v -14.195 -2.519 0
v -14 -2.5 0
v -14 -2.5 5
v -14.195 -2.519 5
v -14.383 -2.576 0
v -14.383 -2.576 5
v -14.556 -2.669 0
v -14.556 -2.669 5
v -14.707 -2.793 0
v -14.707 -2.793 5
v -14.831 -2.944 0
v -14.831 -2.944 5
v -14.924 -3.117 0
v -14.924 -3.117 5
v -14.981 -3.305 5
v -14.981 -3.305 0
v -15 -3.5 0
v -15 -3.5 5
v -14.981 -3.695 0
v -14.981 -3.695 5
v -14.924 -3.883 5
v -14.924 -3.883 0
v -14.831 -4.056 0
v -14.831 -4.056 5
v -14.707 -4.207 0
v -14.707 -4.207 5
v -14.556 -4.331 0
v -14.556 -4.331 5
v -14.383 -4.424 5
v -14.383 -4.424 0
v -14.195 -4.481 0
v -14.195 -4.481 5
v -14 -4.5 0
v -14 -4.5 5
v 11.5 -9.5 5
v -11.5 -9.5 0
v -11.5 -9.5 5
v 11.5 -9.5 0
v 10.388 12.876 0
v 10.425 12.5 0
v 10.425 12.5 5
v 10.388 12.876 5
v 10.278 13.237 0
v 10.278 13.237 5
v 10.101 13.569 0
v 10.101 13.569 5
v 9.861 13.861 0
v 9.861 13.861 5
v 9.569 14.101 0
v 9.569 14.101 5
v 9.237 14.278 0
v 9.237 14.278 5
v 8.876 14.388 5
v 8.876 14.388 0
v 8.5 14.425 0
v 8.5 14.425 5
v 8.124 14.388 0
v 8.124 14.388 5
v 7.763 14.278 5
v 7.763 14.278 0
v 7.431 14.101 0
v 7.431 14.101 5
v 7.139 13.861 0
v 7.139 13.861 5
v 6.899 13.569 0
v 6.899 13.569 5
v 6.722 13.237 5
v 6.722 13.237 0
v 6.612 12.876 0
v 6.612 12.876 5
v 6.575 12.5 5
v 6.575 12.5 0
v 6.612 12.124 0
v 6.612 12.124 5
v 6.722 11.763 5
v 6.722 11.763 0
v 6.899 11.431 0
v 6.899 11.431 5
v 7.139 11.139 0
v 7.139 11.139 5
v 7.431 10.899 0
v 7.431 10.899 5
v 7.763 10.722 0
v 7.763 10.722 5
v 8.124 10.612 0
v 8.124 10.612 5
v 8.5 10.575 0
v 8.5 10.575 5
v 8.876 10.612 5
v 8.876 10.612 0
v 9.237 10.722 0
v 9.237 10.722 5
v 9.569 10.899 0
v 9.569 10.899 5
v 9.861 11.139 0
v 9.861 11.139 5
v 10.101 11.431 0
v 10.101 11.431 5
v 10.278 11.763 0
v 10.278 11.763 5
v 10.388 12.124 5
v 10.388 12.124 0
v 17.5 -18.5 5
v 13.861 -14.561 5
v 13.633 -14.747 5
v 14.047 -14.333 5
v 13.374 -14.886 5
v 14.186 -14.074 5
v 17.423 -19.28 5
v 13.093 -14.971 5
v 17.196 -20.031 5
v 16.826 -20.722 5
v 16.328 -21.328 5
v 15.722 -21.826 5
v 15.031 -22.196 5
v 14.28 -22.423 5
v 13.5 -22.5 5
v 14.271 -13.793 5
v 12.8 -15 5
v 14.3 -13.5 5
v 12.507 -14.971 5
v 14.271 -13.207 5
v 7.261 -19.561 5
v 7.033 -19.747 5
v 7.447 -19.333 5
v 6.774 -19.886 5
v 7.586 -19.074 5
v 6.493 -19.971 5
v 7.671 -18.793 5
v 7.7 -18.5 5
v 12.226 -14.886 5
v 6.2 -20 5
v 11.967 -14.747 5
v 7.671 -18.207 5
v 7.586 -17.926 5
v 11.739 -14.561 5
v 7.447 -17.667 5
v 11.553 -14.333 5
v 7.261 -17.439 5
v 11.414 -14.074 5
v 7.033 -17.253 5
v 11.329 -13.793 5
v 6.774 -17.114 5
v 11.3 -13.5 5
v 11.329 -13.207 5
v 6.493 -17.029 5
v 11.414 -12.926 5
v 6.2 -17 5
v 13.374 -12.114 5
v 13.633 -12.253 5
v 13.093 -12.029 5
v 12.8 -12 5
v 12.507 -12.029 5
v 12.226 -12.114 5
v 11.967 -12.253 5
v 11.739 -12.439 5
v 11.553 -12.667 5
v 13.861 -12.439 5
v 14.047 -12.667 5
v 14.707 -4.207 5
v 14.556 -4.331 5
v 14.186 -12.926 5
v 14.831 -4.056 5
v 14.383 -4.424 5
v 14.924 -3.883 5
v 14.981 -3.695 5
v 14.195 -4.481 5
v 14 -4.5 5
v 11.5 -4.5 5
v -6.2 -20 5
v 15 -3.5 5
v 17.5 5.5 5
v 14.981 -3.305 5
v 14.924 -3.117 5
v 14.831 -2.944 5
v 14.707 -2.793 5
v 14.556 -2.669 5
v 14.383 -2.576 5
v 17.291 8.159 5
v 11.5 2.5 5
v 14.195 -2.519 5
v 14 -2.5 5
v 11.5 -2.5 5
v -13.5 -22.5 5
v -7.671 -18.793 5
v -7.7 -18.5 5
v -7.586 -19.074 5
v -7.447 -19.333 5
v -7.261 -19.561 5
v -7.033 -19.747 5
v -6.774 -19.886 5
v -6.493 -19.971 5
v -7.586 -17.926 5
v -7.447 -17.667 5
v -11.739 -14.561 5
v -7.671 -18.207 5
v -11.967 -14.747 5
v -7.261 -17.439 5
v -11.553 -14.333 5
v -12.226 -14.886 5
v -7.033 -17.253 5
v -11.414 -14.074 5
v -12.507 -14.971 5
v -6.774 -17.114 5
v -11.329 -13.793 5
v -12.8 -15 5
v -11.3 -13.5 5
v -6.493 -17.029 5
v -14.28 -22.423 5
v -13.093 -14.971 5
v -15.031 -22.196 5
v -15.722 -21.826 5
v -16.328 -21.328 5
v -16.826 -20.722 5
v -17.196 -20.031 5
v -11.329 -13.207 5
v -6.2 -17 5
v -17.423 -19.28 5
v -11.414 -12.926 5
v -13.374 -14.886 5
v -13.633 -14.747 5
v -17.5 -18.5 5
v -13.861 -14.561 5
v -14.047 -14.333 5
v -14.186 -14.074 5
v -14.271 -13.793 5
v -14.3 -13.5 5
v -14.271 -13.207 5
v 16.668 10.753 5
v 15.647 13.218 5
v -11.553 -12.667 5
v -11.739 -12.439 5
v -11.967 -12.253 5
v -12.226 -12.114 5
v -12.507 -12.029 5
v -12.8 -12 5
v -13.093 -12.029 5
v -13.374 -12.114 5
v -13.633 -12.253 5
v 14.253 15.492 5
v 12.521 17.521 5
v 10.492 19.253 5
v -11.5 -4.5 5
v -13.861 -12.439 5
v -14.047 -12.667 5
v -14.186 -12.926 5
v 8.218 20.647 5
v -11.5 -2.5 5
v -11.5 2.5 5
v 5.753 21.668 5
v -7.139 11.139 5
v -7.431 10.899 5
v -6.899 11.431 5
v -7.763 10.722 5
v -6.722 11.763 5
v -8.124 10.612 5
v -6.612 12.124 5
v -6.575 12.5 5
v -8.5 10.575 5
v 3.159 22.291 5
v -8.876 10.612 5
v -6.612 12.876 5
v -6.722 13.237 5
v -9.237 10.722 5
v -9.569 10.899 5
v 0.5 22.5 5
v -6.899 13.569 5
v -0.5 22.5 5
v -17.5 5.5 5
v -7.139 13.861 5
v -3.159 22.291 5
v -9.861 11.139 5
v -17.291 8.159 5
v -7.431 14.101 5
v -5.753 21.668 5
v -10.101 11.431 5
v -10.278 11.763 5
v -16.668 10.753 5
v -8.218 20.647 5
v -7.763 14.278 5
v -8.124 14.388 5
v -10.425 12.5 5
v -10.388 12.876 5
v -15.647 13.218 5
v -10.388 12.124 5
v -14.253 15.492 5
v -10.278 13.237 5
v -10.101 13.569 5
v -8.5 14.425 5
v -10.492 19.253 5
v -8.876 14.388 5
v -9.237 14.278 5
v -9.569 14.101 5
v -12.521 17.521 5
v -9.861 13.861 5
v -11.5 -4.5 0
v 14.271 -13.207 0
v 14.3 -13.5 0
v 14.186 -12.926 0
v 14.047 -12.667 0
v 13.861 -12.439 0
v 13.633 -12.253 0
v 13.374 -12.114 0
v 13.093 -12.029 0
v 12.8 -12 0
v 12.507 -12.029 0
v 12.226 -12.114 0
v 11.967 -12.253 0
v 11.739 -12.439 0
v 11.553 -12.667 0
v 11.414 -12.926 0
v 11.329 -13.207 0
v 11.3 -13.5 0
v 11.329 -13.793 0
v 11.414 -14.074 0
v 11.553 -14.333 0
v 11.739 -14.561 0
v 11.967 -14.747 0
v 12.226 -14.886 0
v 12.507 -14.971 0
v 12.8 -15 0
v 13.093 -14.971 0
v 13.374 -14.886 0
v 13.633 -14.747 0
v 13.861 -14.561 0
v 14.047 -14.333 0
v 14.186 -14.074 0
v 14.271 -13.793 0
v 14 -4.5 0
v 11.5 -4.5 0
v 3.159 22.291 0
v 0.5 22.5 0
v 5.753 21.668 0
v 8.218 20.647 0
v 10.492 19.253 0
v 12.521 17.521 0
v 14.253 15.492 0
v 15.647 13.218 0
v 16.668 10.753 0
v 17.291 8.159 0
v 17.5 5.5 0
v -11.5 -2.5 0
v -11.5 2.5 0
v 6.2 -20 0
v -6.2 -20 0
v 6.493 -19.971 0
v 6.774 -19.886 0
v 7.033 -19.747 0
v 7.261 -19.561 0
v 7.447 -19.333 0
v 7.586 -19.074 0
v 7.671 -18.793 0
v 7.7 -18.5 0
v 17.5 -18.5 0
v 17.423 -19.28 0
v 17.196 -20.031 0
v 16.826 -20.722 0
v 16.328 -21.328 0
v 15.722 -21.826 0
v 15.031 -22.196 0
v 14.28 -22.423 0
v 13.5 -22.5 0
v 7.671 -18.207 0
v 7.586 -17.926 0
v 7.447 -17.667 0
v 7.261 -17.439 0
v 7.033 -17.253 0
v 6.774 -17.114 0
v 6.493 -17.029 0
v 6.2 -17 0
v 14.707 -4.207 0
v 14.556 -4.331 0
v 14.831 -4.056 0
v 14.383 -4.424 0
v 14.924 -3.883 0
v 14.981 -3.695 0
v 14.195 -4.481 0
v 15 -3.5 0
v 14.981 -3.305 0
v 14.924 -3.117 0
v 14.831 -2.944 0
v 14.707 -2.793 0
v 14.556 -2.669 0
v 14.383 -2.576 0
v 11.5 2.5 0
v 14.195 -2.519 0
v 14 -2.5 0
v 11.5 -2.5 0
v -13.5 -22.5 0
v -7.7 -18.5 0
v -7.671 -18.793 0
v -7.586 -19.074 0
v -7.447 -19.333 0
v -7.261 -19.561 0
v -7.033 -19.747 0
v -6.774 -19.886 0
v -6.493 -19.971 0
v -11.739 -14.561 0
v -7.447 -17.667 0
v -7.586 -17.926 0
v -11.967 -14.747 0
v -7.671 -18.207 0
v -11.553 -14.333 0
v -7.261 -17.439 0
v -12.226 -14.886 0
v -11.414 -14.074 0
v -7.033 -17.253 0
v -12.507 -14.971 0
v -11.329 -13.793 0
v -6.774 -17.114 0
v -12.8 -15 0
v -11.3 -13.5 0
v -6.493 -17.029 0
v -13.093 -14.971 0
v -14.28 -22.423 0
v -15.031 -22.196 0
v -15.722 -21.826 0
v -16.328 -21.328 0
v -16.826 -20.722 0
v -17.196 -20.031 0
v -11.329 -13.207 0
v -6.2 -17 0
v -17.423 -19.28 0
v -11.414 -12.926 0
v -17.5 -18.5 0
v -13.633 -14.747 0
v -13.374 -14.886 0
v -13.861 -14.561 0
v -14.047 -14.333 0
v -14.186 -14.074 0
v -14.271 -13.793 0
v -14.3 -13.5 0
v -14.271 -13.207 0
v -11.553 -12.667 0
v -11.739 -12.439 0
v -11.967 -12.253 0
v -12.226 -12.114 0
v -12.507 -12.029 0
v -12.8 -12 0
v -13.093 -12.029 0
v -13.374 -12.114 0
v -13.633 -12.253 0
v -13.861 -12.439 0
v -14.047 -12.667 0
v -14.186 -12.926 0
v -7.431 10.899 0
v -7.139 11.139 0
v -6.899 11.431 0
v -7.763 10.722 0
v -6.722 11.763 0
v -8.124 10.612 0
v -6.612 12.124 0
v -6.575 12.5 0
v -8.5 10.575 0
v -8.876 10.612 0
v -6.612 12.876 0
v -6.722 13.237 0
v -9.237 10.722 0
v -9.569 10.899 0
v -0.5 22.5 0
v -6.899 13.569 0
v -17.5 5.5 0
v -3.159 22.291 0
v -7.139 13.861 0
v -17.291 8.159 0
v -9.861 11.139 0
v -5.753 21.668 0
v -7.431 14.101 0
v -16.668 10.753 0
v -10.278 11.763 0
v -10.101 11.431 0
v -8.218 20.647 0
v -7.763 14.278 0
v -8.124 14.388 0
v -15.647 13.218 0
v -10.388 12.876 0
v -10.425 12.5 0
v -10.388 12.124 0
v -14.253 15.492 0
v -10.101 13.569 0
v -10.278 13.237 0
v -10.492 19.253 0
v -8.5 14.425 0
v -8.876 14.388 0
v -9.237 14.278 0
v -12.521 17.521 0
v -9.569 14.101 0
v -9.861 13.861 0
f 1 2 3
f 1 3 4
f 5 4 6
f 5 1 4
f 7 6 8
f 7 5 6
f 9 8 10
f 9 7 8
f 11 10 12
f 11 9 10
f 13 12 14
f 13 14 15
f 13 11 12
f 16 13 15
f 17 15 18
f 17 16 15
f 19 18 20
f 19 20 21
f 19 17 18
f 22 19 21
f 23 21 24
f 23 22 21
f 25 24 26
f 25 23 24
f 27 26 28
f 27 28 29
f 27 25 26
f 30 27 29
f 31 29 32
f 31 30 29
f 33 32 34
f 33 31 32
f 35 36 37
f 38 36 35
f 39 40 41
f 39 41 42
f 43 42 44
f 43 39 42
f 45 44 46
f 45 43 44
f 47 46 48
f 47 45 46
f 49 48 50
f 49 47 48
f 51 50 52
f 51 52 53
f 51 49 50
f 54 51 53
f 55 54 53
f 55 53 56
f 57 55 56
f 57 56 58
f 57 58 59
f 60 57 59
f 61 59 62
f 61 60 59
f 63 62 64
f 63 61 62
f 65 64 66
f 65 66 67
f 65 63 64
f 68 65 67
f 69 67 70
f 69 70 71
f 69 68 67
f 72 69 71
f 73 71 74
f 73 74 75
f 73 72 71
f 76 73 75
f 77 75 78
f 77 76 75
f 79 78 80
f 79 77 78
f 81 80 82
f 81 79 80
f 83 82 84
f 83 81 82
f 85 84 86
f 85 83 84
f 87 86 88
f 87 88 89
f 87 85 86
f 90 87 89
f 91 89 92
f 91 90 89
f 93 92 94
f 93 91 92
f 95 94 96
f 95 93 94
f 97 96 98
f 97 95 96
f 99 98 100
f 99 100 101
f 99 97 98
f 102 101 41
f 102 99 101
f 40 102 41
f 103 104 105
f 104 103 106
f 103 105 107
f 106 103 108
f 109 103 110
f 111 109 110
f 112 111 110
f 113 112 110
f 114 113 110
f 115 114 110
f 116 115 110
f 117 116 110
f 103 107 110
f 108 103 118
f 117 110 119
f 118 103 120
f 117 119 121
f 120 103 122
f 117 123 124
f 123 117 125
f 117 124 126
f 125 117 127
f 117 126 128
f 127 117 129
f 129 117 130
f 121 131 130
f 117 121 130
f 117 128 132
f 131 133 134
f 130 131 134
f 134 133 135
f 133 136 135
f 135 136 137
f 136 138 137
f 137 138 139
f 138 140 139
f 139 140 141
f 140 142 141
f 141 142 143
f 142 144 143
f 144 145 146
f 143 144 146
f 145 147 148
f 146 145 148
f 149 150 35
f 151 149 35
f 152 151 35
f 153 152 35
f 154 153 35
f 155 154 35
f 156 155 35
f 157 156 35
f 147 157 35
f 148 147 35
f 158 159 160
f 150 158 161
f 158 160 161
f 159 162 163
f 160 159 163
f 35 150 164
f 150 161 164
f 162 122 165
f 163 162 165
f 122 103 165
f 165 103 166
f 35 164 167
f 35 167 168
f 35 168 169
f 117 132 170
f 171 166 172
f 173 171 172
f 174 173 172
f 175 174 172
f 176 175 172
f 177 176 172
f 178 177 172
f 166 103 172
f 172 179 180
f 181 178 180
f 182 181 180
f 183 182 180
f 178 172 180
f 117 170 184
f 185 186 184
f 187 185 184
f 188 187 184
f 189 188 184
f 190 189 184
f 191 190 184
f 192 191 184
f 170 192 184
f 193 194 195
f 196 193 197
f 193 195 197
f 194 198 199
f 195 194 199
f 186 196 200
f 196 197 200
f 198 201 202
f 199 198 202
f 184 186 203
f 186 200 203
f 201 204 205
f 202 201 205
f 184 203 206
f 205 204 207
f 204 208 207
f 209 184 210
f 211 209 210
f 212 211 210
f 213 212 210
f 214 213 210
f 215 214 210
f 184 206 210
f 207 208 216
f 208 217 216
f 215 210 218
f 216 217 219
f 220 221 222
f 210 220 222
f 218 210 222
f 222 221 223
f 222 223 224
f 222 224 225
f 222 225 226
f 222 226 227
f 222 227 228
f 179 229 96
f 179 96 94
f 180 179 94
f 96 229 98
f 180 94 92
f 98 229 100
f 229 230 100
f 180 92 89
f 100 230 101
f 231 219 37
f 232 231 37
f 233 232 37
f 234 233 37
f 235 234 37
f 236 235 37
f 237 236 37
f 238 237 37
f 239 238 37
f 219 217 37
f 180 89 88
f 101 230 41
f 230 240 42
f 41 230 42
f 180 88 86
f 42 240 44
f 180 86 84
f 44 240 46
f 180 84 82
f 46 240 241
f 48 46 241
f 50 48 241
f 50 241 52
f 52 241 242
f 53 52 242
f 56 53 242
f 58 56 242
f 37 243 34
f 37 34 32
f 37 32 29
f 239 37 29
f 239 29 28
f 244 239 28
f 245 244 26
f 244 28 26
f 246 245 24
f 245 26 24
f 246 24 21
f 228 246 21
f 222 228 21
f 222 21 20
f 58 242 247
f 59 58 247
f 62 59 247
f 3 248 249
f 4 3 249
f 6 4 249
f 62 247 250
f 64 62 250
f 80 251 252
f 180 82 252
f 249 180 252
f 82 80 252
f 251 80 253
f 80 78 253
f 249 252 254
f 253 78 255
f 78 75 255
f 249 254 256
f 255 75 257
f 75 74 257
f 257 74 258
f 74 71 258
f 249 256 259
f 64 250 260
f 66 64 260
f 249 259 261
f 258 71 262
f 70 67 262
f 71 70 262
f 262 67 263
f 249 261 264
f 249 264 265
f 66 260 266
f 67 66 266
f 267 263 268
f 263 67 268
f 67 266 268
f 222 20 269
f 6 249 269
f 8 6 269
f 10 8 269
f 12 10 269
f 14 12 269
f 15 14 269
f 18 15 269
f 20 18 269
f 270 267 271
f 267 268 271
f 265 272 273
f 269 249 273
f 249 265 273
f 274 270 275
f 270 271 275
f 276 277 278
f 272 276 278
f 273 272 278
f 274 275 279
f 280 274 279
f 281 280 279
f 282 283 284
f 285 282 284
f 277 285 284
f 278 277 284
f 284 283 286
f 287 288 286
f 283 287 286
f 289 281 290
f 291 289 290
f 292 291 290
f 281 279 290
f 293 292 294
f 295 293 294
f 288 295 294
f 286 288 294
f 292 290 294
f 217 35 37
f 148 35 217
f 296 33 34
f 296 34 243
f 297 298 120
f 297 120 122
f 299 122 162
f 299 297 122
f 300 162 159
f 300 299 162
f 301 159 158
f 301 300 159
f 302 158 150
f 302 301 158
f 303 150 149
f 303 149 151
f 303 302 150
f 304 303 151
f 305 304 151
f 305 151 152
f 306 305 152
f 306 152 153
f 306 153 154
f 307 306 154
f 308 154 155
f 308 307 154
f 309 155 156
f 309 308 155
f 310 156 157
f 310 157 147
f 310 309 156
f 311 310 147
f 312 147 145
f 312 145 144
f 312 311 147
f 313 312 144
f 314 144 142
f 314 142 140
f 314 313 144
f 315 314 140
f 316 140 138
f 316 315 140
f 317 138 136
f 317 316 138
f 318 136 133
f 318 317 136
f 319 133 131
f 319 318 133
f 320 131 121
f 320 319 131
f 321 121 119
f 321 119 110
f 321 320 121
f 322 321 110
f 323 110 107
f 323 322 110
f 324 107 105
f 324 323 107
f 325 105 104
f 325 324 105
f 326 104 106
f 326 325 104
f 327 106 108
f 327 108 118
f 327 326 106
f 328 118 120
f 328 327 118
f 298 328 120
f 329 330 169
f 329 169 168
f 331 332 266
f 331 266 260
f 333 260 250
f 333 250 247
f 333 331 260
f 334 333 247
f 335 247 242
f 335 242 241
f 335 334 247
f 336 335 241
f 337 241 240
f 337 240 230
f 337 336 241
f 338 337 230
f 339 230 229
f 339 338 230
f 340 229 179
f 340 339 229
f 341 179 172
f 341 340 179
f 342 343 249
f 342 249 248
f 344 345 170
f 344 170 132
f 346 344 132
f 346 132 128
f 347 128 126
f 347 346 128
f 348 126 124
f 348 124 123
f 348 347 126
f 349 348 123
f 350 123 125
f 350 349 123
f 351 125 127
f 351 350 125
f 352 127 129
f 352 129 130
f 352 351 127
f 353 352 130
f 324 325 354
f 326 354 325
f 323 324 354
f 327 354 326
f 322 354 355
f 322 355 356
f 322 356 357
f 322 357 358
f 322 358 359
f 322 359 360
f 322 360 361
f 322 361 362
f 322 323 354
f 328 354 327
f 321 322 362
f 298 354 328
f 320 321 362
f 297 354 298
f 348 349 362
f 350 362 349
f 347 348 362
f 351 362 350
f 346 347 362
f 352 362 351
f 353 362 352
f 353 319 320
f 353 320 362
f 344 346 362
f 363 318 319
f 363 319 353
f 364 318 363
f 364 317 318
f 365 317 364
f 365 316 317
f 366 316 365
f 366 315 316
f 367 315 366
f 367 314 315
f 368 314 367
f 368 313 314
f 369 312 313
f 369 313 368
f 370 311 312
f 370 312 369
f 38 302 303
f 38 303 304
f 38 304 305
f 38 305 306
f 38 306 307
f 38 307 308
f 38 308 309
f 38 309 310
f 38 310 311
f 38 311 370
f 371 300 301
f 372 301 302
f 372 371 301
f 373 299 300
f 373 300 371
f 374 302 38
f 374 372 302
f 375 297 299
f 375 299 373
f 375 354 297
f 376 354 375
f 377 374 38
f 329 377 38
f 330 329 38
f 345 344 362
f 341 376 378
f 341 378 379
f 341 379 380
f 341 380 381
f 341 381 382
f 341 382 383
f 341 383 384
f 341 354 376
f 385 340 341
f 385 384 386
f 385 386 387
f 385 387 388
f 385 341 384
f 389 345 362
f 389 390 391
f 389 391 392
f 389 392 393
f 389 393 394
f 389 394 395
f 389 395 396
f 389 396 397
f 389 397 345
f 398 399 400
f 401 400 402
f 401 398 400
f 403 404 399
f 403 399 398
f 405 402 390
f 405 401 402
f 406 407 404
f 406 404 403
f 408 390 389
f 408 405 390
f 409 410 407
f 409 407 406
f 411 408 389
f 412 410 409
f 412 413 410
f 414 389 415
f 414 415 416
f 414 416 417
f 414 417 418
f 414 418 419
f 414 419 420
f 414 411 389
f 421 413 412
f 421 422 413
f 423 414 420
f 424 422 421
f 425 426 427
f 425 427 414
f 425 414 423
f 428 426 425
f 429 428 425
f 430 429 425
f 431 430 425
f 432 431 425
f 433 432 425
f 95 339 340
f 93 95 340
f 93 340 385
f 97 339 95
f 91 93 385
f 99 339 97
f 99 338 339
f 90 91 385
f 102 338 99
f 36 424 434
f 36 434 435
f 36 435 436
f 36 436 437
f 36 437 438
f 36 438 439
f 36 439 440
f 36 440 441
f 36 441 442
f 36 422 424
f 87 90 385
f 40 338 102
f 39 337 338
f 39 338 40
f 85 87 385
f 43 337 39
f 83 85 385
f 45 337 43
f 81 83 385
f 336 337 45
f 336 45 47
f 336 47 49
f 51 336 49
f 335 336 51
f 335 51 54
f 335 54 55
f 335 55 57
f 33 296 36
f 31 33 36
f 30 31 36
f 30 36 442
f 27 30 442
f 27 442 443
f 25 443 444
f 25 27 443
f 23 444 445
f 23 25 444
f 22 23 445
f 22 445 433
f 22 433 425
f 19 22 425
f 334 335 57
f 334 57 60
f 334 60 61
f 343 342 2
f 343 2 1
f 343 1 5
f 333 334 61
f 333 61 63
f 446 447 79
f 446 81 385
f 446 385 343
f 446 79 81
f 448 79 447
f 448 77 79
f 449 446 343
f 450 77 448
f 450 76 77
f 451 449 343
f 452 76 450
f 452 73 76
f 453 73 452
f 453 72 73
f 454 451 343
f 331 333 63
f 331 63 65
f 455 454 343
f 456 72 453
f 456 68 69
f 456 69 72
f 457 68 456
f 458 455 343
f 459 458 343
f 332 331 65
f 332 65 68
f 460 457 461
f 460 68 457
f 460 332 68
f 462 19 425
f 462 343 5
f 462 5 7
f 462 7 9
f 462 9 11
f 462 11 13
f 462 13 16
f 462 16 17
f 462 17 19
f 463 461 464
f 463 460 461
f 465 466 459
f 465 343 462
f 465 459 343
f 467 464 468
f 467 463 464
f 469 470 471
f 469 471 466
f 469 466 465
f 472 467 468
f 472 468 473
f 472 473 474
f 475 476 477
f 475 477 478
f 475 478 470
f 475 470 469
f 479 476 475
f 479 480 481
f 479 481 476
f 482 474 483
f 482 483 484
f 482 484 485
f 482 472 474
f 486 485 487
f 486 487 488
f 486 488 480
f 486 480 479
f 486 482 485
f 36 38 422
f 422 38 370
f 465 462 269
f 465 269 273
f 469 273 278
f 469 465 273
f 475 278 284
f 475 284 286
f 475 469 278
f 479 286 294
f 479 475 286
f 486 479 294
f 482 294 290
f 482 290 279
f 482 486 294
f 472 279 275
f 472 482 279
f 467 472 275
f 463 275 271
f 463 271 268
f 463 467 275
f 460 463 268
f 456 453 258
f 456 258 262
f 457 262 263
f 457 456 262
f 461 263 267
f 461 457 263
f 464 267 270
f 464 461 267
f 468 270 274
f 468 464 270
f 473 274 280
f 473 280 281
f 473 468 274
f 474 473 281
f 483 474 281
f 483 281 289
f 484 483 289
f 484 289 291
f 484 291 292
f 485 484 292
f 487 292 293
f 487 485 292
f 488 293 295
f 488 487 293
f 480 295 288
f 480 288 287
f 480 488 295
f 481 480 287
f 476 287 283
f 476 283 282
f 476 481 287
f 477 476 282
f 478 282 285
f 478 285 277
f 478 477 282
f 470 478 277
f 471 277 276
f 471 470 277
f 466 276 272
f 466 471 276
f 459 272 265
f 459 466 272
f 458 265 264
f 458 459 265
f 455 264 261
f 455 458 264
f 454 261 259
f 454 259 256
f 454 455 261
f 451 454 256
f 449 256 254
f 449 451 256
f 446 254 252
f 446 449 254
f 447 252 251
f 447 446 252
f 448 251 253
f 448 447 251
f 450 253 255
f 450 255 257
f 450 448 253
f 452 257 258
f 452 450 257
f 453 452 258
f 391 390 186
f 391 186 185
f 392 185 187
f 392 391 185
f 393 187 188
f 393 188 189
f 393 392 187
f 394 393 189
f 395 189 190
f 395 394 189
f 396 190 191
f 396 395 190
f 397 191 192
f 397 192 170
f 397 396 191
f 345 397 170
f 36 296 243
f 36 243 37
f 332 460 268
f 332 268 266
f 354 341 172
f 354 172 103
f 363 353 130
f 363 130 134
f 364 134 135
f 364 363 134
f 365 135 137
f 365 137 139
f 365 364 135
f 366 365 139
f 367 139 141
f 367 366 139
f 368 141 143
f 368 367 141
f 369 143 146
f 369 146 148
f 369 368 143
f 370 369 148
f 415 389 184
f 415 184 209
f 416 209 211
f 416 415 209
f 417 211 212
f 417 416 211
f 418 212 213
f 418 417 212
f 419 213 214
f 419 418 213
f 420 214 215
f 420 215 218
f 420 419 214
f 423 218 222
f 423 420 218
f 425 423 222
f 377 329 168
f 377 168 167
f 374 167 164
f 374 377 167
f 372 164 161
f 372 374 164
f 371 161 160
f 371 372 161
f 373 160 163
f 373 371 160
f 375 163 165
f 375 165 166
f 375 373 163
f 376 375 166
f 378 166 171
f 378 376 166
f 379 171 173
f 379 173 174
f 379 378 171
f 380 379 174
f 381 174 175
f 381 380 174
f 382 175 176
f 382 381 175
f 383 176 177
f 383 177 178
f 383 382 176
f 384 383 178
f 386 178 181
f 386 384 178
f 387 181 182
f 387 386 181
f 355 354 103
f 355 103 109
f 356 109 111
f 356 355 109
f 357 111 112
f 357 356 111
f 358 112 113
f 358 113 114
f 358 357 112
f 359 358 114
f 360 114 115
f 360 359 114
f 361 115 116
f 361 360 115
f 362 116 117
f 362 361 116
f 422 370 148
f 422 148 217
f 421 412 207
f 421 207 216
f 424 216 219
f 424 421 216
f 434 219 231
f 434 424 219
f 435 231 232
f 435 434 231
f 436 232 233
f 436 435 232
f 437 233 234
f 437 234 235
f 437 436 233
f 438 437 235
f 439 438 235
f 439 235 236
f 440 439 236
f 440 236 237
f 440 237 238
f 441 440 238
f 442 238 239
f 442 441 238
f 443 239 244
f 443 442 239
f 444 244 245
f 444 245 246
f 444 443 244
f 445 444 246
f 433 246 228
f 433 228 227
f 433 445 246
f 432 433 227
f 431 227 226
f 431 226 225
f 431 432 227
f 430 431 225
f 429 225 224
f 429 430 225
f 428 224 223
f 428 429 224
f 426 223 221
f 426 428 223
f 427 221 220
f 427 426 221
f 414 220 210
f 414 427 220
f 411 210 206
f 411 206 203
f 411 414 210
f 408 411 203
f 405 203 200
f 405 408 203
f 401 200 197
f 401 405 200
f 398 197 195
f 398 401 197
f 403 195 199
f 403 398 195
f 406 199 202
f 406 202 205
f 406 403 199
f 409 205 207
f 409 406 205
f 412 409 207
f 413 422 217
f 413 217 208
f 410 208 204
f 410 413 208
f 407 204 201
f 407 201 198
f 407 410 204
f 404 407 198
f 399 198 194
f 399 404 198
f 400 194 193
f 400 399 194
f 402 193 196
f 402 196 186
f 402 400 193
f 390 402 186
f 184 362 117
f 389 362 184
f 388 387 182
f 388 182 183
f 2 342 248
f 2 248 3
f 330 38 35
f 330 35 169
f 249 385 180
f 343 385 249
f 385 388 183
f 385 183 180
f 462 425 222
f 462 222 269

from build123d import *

# Parameters (mm, degrees)
ESQUISSE1_R        = 1.925
ESQUISSE1_R_2      = 1.5
BOSS_EXTRU_1_DEPTH = 5


with BuildPart() as part:
    # Esquisse1 → Boss.-Extru.1 (new body)
    with BuildSketch(Plane.XY):
        with BuildLine():
            Line((13.5, -22.5), (-13.5, -22.5))
            ThreePointArc((-13.5, -22.5), (-16.328427125, -21.328427125), (-17.5, -18.5))
            Line((-17.5, -18.5), (-17.5, 5.5))
            ThreePointArc((-17.5, 5.5), (-12.52081528, 17.52081528), (-0.5, 22.5))
            Line((-0.5, 22.5), (0.5, 22.5))
            ThreePointArc((0.5, 22.5), (12.52081528, 17.52081528), (17.5, 5.5))
            Line((17.5, 5.5), (17.5, -18.5))
            ThreePointArc((17.5, -18.5), (16.328427125, -21.328427125), (13.5, -22.5))
        make_face()
        with Locations((8.5, 12.5)):
            Circle(ESQUISSE1_R, mode=Mode.SUBTRACT)
        with Locations((-8.5, 12.5)):
            Circle(ESQUISSE1_R, mode=Mode.SUBTRACT)
        with Locations((-12.8, -13.5)):
            Circle(ESQUISSE1_R_2, mode=Mode.SUBTRACT)
        with Locations((12.8, -13.5)):
            Circle(ESQUISSE1_R_2, mode=Mode.SUBTRACT)
        with BuildLine():
            Line((-6.2, -20), (6.2, -20))
            ThreePointArc((6.2, -20), (7.260660172, -19.560660172), (7.7, -18.5))
            ThreePointArc((7.7, -18.5), (7.260660172, -17.439339828), (6.2, -17))
            Line((6.2, -17), (-6.2, -17))
            ThreePointArc((-6.2, -17), (-7.260660172, -17.439339828), (-7.7, -18.5))
            ThreePointArc((-7.7, -18.5), (-7.260660172, -19.560660172), (-6.2, -20))
        make_face(mode=Mode.SUBTRACT)
        with BuildLine():
            Line((-11.5, -9.5), (11.5, -9.5))
            Line((11.5, -9.5), (11.5, -4.5))
            Line((11.5, -4.5), (14, -4.5))
            ThreePointArc((14, -4.5), (15, -3.5), (14, -2.5))
            Line((14, -2.5), (11.5, -2.5))
            Line((11.5, -2.5), (11.5, 2.5))
            Line((11.5, 2.5), (-11.5, 2.5))
            Line((-11.5, 2.5), (-11.5, -2.5))
            Line((-11.5, -2.5), (-14, -2.5))
            ThreePointArc((-14, -2.5), (-15, -3.5), (-14, -4.5))
            Line((-14, -4.5), (-11.5, -4.5))
            Line((-11.5, -4.5), (-11.5, -9.5))
        make_face(mode=Mode.SUBTRACT)
    extrude(amount=BOSS_EXTRU_1_DEPTH)


solid = part.part
